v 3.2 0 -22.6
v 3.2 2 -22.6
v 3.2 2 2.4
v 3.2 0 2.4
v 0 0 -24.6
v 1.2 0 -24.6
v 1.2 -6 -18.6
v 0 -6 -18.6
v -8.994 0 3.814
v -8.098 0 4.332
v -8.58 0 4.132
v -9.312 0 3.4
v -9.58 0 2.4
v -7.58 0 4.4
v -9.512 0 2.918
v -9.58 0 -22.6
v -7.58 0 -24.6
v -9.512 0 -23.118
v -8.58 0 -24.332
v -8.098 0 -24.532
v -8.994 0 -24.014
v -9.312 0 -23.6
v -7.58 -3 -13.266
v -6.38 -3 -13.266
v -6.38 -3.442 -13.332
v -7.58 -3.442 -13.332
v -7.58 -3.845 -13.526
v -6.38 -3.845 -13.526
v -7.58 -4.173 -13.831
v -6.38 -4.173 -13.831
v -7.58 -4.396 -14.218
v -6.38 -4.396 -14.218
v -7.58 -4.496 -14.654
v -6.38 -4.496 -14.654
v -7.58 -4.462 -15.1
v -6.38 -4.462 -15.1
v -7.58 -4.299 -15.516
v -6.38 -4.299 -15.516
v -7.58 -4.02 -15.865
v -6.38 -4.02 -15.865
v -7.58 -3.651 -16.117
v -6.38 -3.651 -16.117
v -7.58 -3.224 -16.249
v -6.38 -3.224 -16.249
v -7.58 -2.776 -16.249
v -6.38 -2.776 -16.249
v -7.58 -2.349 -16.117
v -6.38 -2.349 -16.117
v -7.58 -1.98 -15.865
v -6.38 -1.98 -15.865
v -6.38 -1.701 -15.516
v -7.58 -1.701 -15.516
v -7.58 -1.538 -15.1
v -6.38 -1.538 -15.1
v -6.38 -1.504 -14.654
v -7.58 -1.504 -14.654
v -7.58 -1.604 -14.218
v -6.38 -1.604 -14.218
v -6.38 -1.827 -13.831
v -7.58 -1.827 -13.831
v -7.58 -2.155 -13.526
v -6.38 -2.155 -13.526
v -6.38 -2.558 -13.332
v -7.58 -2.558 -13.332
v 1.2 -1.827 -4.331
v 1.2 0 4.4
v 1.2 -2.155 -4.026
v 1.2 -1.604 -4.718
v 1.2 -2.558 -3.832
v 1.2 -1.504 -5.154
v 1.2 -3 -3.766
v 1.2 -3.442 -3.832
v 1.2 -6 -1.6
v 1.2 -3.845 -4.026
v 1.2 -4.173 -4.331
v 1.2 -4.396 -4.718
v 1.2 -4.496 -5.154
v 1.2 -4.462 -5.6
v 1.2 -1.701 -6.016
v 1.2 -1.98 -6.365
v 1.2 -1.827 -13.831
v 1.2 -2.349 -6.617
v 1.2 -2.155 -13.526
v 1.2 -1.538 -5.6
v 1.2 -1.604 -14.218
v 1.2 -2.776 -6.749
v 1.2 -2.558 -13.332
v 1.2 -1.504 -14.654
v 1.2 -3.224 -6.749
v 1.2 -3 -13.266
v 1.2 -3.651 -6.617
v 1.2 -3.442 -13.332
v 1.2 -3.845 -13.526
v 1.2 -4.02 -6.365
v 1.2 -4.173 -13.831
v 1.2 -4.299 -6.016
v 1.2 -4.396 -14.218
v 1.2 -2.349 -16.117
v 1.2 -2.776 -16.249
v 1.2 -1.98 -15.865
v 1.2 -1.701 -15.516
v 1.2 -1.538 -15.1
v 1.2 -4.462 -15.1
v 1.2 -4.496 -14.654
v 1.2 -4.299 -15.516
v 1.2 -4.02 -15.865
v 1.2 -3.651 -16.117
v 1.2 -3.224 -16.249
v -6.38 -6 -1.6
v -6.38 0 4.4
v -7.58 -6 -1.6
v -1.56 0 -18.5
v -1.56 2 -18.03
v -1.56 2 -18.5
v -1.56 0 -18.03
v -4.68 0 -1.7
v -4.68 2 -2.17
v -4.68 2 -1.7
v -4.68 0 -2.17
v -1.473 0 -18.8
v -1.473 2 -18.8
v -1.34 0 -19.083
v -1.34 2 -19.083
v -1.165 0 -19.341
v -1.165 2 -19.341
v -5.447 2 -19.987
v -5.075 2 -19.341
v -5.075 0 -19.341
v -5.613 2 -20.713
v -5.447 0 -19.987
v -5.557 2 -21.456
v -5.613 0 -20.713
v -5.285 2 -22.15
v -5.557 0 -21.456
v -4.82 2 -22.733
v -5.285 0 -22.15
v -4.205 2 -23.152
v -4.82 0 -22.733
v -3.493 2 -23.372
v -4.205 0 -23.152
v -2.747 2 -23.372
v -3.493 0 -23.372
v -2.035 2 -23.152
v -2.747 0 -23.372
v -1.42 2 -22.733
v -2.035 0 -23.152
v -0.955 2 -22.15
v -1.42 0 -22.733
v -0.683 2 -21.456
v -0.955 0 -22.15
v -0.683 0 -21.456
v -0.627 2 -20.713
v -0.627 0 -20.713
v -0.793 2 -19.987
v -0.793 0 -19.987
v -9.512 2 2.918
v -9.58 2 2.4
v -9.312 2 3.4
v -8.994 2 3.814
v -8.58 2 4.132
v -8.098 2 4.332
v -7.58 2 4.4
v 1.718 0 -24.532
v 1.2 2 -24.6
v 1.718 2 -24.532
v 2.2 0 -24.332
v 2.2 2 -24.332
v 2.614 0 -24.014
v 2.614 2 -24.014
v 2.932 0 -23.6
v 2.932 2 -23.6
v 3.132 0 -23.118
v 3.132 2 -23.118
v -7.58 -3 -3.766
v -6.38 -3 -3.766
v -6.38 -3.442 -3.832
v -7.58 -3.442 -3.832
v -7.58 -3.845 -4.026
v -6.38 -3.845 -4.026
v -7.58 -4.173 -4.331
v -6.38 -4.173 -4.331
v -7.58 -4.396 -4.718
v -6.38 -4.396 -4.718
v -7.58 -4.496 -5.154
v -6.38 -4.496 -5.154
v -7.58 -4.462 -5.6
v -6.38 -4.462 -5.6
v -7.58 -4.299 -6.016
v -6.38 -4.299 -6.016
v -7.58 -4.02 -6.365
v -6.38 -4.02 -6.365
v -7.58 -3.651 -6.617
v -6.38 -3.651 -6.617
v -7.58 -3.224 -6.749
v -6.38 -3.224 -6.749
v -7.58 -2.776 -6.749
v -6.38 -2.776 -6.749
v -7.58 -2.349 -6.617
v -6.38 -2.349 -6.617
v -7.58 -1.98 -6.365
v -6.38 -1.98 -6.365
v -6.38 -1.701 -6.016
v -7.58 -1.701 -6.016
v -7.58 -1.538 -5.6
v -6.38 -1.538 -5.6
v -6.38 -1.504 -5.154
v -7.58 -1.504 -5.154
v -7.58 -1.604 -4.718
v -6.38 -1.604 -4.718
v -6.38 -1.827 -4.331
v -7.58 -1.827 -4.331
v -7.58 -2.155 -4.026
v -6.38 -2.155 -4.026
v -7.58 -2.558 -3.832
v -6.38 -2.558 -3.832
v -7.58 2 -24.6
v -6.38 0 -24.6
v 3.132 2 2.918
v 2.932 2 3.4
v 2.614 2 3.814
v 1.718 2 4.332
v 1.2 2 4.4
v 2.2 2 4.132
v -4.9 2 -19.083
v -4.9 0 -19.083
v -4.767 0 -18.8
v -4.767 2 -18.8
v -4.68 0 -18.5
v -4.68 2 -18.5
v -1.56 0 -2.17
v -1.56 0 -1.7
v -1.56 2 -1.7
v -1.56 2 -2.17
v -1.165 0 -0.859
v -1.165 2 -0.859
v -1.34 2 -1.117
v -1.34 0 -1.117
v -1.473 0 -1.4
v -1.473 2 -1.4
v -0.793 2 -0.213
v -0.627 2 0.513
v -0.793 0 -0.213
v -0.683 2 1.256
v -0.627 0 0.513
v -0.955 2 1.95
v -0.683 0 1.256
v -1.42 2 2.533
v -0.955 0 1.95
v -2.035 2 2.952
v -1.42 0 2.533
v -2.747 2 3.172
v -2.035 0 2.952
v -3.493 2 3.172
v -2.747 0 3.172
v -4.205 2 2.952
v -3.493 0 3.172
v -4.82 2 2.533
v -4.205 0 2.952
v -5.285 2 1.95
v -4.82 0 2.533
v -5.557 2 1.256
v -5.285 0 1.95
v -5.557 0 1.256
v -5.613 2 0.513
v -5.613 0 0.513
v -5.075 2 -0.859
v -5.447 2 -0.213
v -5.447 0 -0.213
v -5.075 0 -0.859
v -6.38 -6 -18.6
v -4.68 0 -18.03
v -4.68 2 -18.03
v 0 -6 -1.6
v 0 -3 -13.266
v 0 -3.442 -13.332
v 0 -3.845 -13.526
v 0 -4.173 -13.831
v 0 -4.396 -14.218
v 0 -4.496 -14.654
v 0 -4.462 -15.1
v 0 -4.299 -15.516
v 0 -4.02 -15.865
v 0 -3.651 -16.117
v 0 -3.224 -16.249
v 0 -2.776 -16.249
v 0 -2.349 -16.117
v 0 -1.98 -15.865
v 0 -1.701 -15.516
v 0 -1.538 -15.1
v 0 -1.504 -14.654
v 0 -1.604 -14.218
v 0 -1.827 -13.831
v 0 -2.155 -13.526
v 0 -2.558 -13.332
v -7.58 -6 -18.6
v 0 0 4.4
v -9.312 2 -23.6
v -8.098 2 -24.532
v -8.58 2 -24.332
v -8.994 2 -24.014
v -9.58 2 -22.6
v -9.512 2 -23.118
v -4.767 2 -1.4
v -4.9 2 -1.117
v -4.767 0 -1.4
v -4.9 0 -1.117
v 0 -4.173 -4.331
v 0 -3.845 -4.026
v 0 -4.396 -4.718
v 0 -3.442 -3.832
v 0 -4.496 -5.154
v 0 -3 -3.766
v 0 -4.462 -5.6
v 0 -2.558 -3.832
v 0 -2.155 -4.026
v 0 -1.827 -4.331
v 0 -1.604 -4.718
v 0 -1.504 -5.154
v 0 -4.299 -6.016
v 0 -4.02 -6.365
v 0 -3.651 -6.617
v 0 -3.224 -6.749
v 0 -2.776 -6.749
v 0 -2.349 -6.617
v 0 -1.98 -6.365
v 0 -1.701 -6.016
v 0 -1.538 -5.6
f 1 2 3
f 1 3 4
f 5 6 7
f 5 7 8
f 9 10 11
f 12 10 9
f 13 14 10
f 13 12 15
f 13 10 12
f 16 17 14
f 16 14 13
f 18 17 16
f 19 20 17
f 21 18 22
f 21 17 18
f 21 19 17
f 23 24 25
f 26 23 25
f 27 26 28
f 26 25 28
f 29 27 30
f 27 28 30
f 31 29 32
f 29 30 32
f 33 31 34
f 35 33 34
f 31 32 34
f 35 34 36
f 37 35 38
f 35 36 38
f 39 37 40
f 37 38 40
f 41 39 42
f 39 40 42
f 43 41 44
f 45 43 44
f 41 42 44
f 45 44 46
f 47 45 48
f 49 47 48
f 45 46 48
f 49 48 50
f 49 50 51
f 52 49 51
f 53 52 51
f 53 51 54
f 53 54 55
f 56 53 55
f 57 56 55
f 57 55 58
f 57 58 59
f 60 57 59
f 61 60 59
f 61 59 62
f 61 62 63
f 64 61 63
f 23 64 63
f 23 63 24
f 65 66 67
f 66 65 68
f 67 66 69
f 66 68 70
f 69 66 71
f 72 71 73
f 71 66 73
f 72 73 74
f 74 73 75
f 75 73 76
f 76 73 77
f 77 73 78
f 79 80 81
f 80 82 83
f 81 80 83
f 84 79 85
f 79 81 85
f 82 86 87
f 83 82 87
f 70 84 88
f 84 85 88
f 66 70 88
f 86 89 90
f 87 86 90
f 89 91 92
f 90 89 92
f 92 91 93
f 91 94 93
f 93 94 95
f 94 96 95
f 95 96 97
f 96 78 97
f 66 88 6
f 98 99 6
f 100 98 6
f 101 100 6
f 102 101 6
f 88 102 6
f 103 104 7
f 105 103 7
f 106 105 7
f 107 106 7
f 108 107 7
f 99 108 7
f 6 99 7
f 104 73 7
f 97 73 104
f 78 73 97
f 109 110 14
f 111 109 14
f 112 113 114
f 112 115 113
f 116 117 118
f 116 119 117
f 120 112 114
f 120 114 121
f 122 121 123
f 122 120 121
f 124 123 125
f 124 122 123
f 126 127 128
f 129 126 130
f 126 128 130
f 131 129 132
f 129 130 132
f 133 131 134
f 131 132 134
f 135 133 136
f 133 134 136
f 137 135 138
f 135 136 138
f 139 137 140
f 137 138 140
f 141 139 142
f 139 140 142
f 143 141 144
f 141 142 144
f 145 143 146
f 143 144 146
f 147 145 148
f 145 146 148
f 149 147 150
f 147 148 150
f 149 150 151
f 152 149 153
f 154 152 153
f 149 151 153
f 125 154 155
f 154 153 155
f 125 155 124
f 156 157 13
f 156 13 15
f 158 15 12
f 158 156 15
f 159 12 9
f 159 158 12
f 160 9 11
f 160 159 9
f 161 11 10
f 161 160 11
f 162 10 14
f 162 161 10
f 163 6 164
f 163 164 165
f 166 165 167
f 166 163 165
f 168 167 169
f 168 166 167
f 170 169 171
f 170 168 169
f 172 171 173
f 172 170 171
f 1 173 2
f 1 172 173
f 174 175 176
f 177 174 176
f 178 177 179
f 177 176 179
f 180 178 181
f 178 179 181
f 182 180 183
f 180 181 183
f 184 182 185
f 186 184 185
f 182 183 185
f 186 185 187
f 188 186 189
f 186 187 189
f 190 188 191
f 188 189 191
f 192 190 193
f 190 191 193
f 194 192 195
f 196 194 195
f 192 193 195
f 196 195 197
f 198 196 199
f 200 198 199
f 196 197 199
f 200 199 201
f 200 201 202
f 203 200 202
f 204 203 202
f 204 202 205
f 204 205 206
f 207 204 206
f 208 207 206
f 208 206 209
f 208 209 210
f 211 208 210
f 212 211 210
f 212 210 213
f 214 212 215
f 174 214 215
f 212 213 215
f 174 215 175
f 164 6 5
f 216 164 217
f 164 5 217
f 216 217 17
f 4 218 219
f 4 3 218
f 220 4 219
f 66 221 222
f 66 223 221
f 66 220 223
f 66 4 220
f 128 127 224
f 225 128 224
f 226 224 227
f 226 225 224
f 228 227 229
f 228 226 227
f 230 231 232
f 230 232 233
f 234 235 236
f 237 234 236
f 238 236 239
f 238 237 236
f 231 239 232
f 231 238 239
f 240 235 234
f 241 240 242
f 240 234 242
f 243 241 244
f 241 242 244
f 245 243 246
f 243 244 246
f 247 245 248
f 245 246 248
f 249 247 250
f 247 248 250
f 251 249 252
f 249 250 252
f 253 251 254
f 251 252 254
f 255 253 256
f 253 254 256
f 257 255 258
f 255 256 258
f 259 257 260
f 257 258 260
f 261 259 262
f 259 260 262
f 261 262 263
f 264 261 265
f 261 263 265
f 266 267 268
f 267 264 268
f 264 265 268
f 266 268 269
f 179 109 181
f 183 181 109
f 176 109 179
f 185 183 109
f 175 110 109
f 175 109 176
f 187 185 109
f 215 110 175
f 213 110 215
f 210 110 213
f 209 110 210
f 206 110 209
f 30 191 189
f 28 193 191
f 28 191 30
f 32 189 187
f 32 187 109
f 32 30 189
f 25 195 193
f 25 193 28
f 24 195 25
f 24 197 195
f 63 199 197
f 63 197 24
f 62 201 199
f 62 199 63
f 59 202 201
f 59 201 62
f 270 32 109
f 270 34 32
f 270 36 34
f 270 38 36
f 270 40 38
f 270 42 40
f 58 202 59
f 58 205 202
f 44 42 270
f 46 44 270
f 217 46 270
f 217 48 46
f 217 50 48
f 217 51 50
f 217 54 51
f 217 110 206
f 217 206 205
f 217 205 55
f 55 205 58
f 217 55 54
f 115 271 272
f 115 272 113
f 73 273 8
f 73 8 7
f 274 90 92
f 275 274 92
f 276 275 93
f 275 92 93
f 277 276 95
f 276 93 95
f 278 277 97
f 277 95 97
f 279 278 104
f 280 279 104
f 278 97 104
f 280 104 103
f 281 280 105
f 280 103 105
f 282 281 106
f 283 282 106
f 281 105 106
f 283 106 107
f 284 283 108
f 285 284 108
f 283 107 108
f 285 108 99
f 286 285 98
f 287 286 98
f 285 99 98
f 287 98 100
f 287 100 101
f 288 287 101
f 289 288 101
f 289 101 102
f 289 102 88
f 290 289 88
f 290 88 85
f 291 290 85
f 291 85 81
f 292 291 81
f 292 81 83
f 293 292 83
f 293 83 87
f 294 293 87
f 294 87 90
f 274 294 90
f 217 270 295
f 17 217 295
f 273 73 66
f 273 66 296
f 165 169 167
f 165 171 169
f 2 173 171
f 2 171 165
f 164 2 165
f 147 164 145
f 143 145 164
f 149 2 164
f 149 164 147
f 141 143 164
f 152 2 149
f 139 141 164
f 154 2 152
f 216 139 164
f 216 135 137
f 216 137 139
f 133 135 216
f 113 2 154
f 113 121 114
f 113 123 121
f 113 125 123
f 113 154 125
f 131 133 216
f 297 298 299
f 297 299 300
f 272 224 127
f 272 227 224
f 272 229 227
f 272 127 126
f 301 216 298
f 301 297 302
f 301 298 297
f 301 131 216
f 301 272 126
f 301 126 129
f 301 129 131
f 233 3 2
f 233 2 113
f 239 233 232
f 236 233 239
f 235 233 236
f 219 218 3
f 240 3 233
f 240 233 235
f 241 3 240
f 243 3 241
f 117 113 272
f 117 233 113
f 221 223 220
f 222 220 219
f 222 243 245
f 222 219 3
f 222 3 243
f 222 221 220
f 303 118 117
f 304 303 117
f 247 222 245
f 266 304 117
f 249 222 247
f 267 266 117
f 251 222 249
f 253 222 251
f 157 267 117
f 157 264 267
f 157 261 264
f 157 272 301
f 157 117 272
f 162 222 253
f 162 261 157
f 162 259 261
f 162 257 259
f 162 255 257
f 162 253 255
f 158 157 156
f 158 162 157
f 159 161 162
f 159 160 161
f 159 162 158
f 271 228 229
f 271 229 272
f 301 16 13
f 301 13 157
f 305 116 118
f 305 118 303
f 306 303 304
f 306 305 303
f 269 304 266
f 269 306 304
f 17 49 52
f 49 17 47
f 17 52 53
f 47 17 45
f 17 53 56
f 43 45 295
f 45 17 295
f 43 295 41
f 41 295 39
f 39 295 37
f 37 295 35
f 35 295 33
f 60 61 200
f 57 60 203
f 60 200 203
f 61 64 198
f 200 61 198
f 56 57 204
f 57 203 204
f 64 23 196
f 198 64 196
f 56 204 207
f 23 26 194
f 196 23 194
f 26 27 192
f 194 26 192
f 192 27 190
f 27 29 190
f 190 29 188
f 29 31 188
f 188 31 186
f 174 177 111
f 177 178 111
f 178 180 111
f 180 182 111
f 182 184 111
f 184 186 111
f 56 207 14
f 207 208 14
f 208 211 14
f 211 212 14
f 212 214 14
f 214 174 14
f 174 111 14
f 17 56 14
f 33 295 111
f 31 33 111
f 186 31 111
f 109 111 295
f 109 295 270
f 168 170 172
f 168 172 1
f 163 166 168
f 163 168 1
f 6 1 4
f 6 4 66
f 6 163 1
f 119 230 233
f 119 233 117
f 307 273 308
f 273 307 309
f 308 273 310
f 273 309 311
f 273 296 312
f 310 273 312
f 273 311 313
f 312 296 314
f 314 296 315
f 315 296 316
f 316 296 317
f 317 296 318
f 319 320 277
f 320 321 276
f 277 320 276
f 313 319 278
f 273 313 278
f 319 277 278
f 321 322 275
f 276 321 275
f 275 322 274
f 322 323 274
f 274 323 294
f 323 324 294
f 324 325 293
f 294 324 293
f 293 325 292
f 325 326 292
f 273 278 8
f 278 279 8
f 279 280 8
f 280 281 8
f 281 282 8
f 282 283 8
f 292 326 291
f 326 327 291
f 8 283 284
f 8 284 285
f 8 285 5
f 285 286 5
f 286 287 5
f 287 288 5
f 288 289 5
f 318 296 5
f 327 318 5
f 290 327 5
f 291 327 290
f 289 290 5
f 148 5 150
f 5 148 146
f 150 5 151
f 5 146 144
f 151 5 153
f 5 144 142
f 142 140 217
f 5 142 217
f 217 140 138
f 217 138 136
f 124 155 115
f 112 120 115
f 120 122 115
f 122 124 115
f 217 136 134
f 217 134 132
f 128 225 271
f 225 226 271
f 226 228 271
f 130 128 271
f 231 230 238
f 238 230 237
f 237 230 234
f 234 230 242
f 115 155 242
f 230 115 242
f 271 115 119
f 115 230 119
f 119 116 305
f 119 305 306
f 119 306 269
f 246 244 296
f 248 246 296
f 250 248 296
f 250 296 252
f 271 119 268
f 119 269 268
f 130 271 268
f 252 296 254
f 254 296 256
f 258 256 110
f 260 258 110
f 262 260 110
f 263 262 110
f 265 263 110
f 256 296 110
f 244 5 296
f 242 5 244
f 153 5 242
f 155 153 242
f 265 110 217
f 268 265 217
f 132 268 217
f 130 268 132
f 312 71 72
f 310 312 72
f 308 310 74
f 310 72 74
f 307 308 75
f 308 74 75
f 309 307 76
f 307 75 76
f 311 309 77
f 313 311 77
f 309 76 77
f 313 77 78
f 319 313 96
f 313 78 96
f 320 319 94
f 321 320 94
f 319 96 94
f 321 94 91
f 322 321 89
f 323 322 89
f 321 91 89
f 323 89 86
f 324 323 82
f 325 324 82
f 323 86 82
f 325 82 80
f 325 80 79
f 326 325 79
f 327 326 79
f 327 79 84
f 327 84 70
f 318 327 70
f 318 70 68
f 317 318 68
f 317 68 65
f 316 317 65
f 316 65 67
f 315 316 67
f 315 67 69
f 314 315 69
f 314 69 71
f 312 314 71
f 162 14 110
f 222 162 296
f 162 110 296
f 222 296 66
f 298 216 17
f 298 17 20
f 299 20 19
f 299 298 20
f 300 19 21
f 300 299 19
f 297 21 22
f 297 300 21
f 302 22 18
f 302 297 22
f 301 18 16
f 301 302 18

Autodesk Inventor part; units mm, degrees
ref_plane "YZ Plane" through (0, 0, 0) normal (1, 0, 0) x (0, 1, 0)
ref_plane "XZ Plane" through (0, 0, 0) normal (0, 1, 0) x (-1, 0, 0)
ref_plane "XY Plane" through (0, 0, 0) normal (0, 0, 1) x (1, 0, 0)
sketch "Sketch1" plane through (0, 0, 0) normal (0, 1, 0) x (-1, 0, 0)
  line L0 (0, 0) -> (6.38, 0)
  line L1 (6.38, 0) -> (6.38, -20.1)
  line L2 (6.38, -20.1) -> (0, -20.1)
  line L3 (0, -20.1) -> (0, 0)
  line L4 (4.68, -1.7) -> (1.56, -1.7)
  line L5 (1.56, -1.7) -> (1.56, -2.17)
  line L6 (1.56, -2.17) -> (4.68, -2.17)
  line L7 (4.68, -2.17) -> (4.68, -1.7)
  line L8 (4.68, -18.03) -> (1.56, -18.03)
  line L9 (1.56, -18.03) -> (1.56, -18.5)
  line L10 (1.56, -18.5) -> (4.68, -18.5)
  line L11 (4.68, -18.5) -> (4.68, -18.03)
  line L12 (7.58, 4.4) -> (-1.2, 4.4)
  line L13 (-1.2, 4.4) -> (-1.2, -24.6)
  line L14 (-1.2, -24.6) -> (7.58, -24.6)
  line L15 (7.58, -24.6) -> (7.58, 4.4)
  circle A0 centre (3.12, -20.9) radius 2.5
  circle A1 centre (3.12, 0.7) radius 2.5
  line L16 (5.105, 3.2) -> (1.56, 3.2) construction
  line L17 (5.6212, -23.4) -> (1.5588, -23.4) construction
  point P0 (3.12, -18.5)
  point P1 (3.82, -1.7)
  point P2 (2.42, -18.5)
  point P3 (2.42, -1.7)
  point P4 (3.82, -18.5)
  dimension "d0" = 20.1
  dimension "d1" = 6.38
  dimension "d2" = 0.47
  dimension "d3" = 3.12
  dimension "d4" = 1.7
  dimension "d5" = 1.7
  dimension "d6" = 1.6
  dimension "d7" = 1.7
  dimension "d8" = 5
  dimension "d9" = 1.2
  dimension "d10" = 1.2
  dimension "d11" = 1.2
  dimension "d12" = 1.2
  dimension "d15" = 2.4
  dimension "d16" = 2.4
extrude "Extrusion1" add sketch "Sketch1" along normal blind 2 contours L0 A1 L4 L5 L6 L7 L1 L2 A0 L10 L11 L8 L9 L3 | L15 L14 L13 L12
fillet "Fillet1" radius 2 4 edges at (-3.82, 1, -1.7) (-2.42, 1, -1.7) (-2.42, 1, -18.5) (-3.82, 1, -18.5)
sketch "Sketch2" plane through (0, 0, 0) normal (0, -1, 0) x (1, 0, 0)
  line L0 (1.2, 4.4) -> (1.2, -24.6) projected
  line L1 (1.2, 4.4) -> (0, 4.4)
  line L2 (0, 4.4) -> (0, -24.6)
  line L3 (0, -24.6) -> (1.2, -24.6)
  line L4 (1.2, -24.6) -> (1.2, 4.4)
  line L5 (1.2, -24.6) -> (-7.58, -24.6) projected
  line L6 (-7.58, -24.6) -> (-7.58, 4.4) projected
  line L7 (-7.58, 4.4) -> (-6.38, 4.4)
  line L8 (-6.38, 4.4) -> (-6.38, -24.6)
  line L9 (-6.38, -24.6) -> (-7.58, -24.6)
  line L10 (-7.58, -24.6) -> (-7.58, 4.4)
  point P0 (0, 0)
  dimension "d18" = 1.2
  dimension "d19" = 1.2
extrude "Extrusion2" add sketch "Sketch2" along normal blind 6
sketch "Sketch3" plane through (1.2, 2, -24.6) normal (0, 0, -1) x (-1, 0, 0)
  line L0 (1.2, -2) -> (7.58, -2) projected
  line L1 (7.58, -2) -> (7.58, -8) projected
  line L2 (8.78, -8) -> (7.58, -8) projected
  line L3 (8.78, -8) -> (8.78, 0) projected
  line L4 (0, 0) -> (8.78, 0) projected
  line L5 (0, -8) -> (0, 0) projected
  line L6 (1.2, -8) -> (0, -8) projected
  line L7 (1.2, -2) -> (1.2, -8) projected
  line L8 (-2, -2) -> (10.78, -2)
  line L9 (10.78, -2) -> (10.78, 0)
  line L10 (10.78, 0) -> (-2, 0)
  line L11 (-2, 0) -> (-2, -2)
  line L12 (1.2, -2) -> (7.58, -2) projected
  line L13 (0, 0) -> (8.78, 0) projected
  point P0 (8.78, 0)
  point P1 (8.78, -2)
  point P2 (0, -2)
  dimension "d22" = 2
  dimension "d23" = 2
extrude "Extrusion3" add sketch "Sketch3" against normal up to surface (29 mm away) contours L8 L11 L10 L5 | L3 L10 L9 L8
sketch "Sketch4" plane through (-7.58, -6, -24.6) normal (-1, 0, 0) x (0, 0, 1)
  line L0 (6.1, 6) -> (6.57, 6) projected
  line L1 (6.57, 6) -> (6.57, 8) projected
  line L2 (6.1, 8) -> (6.57, 8) projected
  line L3 (6.1, 6) -> (6.1, 8) projected
  line L4 (22.43, 6) -> (22.9, 6) projected
  line L5 (22.9, 6) -> (22.9, 8) projected
  line L6 (22.43, 8) -> (22.9, 8) projected
  line L7 (22.43, 6) -> (22.43, 8) projected
  line L8 (29, 6) -> (0, 6) projected
  point P0 (24.6, 6)
  point P1 (9.8342, 3)
  point P2 (19.3342, 3)
  dimension "d26" = 9.5
  dimension "d27" = 3
hole "Hole1" at (-7.58, -3, -14.7658) at (-7.58, -3, -5.2658) direction (1, 0, 0) diameter 3 end through all
fillet "Fillet2" radius 2 4 edges at (-9.58, 1, -24.6) (-9.58, 1, 4.4) (3.2, 1, -24.6) (3.2, 1, 4.4)
chamfer "Chamfer1" distance 6 angle 45 4 edges at (0.6, -6, -24.6) (0.6, -6, 4.4) (-6.98, -6, 4.4) (-6.98, -6, -24.6)
equation "\"d10\" = d9"
equation "\"d11\" = d9"
properties part number "Magnet Mount"
